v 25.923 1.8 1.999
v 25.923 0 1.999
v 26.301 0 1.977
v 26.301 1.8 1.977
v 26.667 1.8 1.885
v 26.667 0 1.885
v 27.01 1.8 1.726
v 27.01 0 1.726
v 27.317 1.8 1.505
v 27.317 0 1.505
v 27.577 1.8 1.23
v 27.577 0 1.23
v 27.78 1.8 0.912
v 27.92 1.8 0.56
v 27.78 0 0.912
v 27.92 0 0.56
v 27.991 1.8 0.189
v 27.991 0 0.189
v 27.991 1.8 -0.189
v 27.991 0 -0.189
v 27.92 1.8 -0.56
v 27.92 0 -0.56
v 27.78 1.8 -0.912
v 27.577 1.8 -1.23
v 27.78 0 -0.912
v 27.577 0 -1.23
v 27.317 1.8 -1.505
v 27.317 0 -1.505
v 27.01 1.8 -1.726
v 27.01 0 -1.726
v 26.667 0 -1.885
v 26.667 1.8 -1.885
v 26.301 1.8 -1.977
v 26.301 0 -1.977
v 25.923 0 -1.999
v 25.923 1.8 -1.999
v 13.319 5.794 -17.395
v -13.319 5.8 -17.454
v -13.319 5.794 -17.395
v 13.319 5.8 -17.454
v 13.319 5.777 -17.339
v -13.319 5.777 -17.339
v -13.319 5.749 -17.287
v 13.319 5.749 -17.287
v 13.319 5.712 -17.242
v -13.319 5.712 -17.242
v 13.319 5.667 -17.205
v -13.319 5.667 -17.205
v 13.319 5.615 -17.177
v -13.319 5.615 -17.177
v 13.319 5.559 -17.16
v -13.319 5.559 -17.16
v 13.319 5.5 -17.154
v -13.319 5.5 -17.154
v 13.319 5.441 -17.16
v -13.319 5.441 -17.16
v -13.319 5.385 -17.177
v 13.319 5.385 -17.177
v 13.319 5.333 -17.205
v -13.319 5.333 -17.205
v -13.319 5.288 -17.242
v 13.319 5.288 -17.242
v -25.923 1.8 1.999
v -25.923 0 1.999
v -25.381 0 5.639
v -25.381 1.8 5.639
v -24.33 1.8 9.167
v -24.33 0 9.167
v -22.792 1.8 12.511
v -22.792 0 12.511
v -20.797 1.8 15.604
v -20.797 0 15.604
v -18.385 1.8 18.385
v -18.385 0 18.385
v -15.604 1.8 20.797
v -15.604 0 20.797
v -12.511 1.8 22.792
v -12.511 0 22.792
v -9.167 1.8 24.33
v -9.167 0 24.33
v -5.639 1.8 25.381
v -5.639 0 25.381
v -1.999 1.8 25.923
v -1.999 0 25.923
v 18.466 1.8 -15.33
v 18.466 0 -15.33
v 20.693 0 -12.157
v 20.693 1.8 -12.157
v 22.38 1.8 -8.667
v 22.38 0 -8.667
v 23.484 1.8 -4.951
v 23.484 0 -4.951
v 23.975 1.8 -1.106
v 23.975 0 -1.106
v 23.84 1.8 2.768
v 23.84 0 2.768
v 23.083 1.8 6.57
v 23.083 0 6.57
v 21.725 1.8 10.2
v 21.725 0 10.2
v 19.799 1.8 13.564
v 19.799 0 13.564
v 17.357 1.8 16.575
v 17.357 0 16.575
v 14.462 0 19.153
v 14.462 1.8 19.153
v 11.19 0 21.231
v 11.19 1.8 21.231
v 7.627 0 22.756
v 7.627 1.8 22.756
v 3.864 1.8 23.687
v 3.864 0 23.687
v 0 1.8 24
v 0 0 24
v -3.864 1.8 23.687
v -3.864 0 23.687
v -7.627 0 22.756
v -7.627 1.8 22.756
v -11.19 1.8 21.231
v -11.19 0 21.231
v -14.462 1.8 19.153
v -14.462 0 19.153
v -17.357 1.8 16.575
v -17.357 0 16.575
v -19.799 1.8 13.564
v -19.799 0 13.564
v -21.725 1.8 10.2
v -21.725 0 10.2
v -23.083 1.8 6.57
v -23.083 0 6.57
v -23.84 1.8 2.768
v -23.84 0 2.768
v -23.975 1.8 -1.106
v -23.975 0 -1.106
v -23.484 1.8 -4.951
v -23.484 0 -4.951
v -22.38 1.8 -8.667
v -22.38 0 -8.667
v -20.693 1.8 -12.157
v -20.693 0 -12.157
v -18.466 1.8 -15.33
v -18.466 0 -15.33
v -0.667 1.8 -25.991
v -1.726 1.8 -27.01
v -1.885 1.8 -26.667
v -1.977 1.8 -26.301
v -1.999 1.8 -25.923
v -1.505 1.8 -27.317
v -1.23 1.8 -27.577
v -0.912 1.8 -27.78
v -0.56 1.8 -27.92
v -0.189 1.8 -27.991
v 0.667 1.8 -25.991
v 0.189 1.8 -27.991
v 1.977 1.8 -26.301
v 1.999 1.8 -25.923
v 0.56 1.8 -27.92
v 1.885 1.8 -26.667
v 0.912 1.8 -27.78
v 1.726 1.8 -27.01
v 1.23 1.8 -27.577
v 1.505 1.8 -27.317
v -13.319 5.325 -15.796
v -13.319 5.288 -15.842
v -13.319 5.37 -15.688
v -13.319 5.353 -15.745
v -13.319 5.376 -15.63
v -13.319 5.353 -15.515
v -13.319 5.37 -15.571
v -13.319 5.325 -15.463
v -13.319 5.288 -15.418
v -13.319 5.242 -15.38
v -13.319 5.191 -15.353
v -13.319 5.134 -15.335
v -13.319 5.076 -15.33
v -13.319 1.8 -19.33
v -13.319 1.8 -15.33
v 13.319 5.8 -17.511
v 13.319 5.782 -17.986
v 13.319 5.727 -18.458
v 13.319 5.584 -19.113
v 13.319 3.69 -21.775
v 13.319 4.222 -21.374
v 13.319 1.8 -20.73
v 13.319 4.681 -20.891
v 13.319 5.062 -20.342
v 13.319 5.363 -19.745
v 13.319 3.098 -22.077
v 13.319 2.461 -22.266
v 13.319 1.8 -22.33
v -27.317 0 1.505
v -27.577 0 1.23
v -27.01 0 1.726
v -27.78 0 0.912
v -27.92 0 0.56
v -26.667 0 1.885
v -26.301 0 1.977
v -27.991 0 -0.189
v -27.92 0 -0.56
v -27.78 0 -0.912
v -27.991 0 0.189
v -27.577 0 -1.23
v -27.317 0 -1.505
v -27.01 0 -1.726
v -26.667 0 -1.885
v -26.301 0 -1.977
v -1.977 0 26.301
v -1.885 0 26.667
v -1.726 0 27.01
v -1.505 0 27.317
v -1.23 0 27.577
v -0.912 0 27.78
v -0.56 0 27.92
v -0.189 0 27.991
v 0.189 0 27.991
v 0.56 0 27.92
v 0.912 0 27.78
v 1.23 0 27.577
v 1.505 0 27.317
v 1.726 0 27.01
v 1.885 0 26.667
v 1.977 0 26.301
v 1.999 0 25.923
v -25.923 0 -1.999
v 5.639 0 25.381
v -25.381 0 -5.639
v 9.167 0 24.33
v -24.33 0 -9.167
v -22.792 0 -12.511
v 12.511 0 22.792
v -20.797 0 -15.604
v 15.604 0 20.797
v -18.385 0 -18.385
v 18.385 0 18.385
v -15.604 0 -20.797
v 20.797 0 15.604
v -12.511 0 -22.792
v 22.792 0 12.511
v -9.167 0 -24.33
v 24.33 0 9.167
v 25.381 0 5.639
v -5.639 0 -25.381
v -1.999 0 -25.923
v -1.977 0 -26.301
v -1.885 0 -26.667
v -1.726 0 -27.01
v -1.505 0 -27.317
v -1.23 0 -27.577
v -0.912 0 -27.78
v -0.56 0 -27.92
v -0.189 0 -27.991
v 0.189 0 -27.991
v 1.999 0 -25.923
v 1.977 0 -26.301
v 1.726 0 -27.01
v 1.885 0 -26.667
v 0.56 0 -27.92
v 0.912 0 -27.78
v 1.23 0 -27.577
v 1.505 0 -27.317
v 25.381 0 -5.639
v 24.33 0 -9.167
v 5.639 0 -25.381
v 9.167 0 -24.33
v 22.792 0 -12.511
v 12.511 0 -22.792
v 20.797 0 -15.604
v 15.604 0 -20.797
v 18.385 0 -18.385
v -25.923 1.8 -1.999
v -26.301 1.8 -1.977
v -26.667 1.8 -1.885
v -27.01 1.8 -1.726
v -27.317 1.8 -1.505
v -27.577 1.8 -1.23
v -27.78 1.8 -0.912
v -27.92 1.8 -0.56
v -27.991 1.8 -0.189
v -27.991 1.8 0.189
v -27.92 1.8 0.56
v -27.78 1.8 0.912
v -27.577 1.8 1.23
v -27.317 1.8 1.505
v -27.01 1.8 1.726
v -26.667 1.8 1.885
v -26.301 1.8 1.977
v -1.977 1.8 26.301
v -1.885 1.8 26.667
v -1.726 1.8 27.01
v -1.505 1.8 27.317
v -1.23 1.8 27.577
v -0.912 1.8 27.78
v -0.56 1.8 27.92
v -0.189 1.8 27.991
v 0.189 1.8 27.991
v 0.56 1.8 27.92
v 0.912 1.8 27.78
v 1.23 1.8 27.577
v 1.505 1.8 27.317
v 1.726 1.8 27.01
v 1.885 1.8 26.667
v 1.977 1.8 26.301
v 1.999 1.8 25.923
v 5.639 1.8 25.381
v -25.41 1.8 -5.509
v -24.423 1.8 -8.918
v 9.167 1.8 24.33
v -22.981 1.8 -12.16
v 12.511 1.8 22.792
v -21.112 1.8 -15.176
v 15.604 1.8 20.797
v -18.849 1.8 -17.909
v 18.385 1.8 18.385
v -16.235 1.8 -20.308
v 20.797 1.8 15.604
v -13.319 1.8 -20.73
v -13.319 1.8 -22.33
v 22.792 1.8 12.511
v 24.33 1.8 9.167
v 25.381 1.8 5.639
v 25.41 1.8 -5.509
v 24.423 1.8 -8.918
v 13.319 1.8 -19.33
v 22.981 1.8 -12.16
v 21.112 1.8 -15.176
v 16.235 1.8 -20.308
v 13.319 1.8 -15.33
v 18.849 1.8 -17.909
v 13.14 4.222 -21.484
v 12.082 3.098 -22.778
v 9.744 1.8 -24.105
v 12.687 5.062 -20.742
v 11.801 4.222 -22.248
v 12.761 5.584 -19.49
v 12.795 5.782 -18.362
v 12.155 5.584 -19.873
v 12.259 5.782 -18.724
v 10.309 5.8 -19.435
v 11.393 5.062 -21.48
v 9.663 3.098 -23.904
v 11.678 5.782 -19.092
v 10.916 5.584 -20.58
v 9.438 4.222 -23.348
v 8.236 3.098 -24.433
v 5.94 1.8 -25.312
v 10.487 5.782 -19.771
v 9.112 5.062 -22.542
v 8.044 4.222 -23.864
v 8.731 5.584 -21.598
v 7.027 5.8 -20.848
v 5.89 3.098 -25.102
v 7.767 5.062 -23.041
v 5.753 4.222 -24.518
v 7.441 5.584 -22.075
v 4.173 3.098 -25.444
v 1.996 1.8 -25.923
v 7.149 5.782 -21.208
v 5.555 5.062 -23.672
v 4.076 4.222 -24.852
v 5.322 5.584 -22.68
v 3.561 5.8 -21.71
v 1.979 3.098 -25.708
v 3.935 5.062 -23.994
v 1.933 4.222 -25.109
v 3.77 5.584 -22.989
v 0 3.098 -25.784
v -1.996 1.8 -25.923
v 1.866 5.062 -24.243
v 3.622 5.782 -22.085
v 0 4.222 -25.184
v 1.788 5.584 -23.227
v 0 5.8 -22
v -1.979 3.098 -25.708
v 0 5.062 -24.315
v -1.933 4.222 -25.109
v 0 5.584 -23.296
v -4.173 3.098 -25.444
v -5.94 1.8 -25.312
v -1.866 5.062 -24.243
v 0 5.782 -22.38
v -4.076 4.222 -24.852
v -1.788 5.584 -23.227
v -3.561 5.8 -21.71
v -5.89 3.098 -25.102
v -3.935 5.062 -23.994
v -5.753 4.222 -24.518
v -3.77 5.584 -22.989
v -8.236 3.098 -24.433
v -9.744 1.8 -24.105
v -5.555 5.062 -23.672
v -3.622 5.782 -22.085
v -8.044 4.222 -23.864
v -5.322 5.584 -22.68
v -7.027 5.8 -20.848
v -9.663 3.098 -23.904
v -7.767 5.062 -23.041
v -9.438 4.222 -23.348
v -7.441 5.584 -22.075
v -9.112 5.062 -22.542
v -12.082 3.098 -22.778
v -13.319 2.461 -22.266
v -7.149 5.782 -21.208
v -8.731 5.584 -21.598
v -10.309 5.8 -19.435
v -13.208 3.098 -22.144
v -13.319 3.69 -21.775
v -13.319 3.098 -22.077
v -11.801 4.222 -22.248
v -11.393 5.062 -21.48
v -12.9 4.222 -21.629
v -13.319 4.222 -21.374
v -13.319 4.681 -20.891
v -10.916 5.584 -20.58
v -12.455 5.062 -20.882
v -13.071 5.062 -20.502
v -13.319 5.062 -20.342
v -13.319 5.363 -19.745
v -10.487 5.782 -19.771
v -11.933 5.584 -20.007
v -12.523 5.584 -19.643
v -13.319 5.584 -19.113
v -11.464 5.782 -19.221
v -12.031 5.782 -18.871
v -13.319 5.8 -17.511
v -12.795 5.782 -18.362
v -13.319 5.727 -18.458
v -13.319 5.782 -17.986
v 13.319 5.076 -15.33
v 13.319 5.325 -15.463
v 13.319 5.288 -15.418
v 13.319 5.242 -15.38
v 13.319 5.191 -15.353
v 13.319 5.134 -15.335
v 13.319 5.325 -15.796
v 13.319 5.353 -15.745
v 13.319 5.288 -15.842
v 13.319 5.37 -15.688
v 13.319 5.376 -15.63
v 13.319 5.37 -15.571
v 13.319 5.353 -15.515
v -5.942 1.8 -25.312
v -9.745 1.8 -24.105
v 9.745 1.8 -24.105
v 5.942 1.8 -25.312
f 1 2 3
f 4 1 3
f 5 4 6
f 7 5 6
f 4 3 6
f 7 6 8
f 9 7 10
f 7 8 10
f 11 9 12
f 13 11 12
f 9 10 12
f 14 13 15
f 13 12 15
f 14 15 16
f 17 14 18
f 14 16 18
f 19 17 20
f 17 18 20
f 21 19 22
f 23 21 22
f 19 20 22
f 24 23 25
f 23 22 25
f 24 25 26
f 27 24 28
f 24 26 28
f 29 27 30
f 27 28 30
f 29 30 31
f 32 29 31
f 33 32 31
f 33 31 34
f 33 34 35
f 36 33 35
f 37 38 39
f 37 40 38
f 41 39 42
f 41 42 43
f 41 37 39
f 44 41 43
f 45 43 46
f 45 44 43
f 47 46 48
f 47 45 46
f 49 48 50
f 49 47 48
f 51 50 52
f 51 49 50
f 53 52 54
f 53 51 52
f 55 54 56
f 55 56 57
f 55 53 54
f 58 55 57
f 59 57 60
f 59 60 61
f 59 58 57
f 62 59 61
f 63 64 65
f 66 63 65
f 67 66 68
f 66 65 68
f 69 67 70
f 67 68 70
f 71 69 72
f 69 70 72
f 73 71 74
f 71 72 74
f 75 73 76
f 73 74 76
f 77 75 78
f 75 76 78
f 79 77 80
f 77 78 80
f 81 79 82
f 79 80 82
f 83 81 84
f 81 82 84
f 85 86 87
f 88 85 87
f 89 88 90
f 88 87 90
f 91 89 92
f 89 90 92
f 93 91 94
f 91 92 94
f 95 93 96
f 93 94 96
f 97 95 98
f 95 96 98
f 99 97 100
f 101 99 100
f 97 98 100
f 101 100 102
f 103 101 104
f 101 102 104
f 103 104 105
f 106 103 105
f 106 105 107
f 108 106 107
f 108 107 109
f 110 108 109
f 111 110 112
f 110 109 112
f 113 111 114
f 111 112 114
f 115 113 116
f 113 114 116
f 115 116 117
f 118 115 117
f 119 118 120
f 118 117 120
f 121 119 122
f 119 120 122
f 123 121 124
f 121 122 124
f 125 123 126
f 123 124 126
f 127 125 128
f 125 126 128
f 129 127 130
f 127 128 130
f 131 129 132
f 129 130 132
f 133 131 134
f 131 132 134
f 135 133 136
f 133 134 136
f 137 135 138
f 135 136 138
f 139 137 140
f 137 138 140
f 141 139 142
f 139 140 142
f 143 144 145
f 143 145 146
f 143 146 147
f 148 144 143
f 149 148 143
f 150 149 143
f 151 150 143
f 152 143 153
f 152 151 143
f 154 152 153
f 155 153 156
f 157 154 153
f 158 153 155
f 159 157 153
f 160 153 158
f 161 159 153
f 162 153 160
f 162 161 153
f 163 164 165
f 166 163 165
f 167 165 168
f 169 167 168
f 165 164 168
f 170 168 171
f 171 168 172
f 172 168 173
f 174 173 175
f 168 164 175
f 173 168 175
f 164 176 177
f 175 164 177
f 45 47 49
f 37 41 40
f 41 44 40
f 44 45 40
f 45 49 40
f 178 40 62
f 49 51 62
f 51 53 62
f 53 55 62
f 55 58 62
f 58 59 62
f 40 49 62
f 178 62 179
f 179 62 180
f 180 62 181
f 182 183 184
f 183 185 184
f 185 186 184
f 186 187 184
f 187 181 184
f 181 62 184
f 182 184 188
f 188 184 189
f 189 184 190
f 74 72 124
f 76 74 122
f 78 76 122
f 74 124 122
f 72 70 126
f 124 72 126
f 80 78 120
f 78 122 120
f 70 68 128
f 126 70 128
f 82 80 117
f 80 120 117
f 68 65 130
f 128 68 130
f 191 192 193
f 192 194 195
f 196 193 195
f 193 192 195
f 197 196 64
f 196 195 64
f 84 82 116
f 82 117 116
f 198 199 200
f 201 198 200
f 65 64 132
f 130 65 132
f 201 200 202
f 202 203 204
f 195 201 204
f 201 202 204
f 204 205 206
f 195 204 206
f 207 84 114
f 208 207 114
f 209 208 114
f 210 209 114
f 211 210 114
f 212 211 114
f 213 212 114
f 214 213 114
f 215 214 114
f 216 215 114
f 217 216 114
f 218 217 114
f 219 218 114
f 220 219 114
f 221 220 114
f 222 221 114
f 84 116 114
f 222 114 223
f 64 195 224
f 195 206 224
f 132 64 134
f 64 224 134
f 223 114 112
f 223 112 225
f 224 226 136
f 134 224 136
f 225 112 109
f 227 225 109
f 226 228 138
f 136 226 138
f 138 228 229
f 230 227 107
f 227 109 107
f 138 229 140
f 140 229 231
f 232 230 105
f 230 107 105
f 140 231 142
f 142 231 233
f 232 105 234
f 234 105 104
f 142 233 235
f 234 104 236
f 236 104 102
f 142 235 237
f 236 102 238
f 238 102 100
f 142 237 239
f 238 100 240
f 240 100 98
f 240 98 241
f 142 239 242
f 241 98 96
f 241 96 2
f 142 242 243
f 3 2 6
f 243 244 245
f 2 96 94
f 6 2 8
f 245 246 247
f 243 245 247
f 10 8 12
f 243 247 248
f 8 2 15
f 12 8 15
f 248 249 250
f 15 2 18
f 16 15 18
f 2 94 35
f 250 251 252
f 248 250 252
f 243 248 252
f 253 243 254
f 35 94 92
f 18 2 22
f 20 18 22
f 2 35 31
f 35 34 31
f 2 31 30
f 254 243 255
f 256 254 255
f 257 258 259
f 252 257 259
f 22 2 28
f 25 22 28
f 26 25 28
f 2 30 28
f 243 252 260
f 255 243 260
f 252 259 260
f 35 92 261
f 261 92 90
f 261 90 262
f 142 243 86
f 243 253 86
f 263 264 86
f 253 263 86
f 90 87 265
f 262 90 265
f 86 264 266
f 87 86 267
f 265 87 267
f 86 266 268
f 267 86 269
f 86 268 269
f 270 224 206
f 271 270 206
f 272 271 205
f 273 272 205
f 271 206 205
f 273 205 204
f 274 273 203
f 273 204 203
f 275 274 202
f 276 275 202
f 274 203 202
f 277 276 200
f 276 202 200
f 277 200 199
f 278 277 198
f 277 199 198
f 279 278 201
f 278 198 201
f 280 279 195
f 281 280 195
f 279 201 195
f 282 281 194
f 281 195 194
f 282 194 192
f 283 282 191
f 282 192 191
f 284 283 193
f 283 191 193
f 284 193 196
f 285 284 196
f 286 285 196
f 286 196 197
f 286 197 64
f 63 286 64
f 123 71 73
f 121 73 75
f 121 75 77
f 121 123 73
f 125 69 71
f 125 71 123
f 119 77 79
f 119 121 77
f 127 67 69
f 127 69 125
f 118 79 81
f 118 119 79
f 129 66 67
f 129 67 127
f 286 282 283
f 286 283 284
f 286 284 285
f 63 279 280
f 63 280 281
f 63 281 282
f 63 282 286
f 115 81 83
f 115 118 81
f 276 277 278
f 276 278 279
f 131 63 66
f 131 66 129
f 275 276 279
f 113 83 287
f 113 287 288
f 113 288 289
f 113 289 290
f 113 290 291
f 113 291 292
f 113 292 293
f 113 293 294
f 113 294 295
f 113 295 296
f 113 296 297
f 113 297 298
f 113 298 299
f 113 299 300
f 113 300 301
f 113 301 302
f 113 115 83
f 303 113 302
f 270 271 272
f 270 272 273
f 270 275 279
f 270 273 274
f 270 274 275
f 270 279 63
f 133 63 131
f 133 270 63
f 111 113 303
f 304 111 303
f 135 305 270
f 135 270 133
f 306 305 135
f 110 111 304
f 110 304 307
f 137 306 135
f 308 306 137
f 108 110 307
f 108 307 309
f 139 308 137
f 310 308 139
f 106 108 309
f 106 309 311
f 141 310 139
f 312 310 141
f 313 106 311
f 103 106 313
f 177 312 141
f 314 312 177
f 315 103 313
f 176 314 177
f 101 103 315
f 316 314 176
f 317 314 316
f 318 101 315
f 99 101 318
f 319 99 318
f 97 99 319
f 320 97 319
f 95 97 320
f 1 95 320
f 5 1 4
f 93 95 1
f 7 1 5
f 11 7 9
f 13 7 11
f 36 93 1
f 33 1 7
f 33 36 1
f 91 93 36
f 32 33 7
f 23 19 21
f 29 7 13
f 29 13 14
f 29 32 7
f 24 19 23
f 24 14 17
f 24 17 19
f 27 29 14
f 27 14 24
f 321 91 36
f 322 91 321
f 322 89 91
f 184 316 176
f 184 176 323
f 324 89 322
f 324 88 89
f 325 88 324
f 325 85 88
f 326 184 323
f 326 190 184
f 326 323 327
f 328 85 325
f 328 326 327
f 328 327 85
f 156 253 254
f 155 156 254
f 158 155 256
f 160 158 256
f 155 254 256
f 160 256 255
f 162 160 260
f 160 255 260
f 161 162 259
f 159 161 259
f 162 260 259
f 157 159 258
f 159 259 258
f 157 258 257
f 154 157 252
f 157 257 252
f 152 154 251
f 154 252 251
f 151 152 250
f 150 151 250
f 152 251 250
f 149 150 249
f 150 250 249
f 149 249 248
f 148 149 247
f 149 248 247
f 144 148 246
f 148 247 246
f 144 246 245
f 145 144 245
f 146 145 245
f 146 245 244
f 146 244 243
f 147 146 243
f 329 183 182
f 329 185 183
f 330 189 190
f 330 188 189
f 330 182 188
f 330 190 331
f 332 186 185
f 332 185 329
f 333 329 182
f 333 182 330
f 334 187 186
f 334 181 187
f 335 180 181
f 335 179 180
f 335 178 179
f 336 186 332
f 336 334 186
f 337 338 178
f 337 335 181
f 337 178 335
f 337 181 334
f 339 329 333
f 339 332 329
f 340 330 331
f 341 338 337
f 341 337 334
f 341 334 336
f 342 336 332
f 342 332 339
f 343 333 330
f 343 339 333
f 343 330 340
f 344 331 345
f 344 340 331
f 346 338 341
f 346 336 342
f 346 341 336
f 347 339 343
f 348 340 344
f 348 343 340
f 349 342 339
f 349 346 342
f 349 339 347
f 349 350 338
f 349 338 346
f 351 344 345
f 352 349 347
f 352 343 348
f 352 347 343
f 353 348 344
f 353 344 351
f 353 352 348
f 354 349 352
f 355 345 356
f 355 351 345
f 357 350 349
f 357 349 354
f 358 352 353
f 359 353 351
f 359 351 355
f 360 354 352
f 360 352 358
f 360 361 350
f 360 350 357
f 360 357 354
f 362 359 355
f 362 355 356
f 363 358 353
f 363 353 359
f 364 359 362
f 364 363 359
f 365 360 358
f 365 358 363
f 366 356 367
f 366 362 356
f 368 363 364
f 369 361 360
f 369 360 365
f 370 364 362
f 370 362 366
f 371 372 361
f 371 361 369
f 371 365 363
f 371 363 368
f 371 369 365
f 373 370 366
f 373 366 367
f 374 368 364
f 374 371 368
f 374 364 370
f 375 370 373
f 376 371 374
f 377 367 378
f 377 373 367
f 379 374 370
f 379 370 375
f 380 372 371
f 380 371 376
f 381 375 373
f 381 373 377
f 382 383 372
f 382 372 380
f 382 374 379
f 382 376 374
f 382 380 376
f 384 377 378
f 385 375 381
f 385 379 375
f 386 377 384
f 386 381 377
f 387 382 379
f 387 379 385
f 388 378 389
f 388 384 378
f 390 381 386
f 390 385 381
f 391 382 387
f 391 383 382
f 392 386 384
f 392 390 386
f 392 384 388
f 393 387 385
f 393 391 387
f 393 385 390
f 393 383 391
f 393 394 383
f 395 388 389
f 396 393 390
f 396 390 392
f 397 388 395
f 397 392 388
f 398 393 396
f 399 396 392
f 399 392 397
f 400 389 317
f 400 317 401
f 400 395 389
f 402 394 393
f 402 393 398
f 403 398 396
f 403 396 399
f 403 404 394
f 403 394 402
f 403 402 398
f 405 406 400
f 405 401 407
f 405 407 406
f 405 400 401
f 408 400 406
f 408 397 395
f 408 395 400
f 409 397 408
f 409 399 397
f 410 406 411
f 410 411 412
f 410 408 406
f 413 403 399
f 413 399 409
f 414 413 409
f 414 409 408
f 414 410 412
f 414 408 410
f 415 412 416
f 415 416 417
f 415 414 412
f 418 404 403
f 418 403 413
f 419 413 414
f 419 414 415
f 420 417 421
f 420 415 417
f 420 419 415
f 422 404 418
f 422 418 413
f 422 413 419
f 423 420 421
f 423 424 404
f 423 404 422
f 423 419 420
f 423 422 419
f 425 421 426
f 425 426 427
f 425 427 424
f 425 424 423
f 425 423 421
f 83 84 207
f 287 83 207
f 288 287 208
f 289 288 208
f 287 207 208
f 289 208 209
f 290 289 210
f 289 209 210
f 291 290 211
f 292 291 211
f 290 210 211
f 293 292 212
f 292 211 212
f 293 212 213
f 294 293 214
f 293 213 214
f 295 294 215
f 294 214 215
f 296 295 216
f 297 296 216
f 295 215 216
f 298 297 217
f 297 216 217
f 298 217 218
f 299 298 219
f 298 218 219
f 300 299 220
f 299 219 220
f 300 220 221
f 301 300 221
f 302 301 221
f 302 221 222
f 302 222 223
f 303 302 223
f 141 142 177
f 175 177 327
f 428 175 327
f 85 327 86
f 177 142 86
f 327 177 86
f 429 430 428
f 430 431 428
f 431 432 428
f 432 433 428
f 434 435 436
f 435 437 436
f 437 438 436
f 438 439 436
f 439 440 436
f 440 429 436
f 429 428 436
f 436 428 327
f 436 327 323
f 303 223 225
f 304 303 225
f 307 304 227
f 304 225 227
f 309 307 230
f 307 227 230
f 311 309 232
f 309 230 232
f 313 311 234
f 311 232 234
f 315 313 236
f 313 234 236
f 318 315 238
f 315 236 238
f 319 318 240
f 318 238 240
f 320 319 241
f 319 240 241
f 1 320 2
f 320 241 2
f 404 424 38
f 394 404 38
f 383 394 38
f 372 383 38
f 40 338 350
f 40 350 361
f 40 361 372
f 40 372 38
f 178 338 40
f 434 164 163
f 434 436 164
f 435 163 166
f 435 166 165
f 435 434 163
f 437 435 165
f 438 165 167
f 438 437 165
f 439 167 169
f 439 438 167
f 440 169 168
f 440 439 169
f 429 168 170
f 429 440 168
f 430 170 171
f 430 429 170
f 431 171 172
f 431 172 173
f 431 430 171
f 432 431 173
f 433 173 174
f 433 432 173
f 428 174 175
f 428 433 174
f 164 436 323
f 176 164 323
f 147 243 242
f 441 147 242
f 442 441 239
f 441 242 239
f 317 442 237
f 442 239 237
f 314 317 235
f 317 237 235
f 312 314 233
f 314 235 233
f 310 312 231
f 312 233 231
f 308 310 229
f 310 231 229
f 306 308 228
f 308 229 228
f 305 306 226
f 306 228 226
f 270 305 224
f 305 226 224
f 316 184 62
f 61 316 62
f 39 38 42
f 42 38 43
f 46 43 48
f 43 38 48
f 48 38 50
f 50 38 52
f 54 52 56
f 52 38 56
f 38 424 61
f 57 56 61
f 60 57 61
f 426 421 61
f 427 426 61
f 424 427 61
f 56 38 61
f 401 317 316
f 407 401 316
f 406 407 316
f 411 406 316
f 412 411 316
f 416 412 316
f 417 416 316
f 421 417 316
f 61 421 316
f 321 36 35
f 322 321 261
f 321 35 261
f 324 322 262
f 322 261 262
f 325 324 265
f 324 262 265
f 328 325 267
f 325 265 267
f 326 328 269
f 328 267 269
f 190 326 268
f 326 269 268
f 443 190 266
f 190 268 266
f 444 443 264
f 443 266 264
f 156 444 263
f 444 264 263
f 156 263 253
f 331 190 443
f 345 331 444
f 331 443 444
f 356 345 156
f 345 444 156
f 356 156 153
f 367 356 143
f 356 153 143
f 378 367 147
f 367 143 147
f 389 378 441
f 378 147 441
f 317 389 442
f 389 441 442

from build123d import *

# Parameters (mm, degrees)
BOSS_EXTRUDE1_DEPTH = 1.8
BOSS_EXTRUDE3_DEPTH = 4
CUT_EXTRUDE1_DEPTH  = 51.248019596
FILLET1_R           = 4
FILLET2_R           = 0.3


with BuildPart() as part:
    # Sketch1 → Boss-Extrude1 (new body)
    with BuildSketch(Plane(origin=(0, 0, 0), x_dir=(1, 0, 0), z_dir=(0, 1, 0))):
        with BuildLine():
            ThreePointArc((-1.998520163, 25.923076923), (-18.384776311, 18.384776311), (-25.923076923, 1.998520163))
            ThreePointArc((-25.923076923, 1.998520163), (-28, 0), (-25.923076923, -1.998520163))
            ThreePointArc((-25.923076923, -1.998520163), (-18.384776311, -18.384776311), (-1.998520163, -25.923076923))
            ThreePointArc((-1.998520163, -25.923076923), (0, -28), (1.998520163, -25.923076923))
            ThreePointArc((1.998520163, -25.923076923), (18.384776311, -18.384776311), (25.923076923, -1.998520163))
            ThreePointArc((25.923076923, -1.998520163), (28, 0), (25.923076923, 1.998520163))
            ThreePointArc((25.923076923, 1.998520163), (18.384776311, 18.384776311), (1.998520163, 25.923076923))
            ThreePointArc((1.998520163, 25.923076923), (0, 28), (-1.998520163, 25.923076923))
        make_face()
        with BuildLine():
            Line((-18.466185313, 15.329709717), (18.466185313, 15.329709717))
            ThreePointArc((18.466185313, 15.329709717), (0, -24), (-18.466185313, 15.329709717))
        make_face(mode=Mode.SUBTRACT)
    extrude(amount=BOSS_EXTRUDE1_DEPTH)

    # Sketch2 → Boss-Extrude3 (add)
    with BuildSketch(Plane(origin=(0, 1.8, 0), x_dir=(1, 0, 0), z_dir=(0, 1, 0))):
        with BuildLine():
            Line((-13.318560882, 15.329709717), (13.318560882, 15.329709717))
            Line((13.318560882, 15.329709717), (13.318560882, 22.329709717))
            ThreePointArc((13.318560882, 22.329709717), (0, 26), (-13.318560882, 22.329709717))
            Line((-13.318560882, 22.329709717), (-13.318560882, 15.329709717))
        make_face()
    extrude(amount=BOSS_EXTRUDE3_DEPTH)

    # Sketch3 → Cut-Extrude1 (cut, through all)
    with BuildSketch(Plane.ZY.offset(13.318560882)):
        Polygon((-15.329709717, 5.8), (-19.329709717, 1.8), (-20.729709717, 1.8), (-16.729709717, 5.8), align=None)
    extrude(amount=-CUT_EXTRUDE1_DEPTH, mode=Mode.SUBTRACT)

    # Fillet1
    fillet1_edges = [part.edges().sort_by_distance(p)[0] for p in [
        (0, 5.8, -26),
    ]]
    fillet(fillet1_edges, radius=FILLET1_R - 0.0001)  # a hair under: the kernel refuses the full size

    # Fillet2
    fillet2_edges = [part.edges().sort_by_distance(p)[0] for p in [
        (0, 5.8, -15.329709717),
        (0, 5.8, -16.729709717),
    ]]
    fillet(fillet2_edges, radius=FILLET2_R)


solid = part.part
